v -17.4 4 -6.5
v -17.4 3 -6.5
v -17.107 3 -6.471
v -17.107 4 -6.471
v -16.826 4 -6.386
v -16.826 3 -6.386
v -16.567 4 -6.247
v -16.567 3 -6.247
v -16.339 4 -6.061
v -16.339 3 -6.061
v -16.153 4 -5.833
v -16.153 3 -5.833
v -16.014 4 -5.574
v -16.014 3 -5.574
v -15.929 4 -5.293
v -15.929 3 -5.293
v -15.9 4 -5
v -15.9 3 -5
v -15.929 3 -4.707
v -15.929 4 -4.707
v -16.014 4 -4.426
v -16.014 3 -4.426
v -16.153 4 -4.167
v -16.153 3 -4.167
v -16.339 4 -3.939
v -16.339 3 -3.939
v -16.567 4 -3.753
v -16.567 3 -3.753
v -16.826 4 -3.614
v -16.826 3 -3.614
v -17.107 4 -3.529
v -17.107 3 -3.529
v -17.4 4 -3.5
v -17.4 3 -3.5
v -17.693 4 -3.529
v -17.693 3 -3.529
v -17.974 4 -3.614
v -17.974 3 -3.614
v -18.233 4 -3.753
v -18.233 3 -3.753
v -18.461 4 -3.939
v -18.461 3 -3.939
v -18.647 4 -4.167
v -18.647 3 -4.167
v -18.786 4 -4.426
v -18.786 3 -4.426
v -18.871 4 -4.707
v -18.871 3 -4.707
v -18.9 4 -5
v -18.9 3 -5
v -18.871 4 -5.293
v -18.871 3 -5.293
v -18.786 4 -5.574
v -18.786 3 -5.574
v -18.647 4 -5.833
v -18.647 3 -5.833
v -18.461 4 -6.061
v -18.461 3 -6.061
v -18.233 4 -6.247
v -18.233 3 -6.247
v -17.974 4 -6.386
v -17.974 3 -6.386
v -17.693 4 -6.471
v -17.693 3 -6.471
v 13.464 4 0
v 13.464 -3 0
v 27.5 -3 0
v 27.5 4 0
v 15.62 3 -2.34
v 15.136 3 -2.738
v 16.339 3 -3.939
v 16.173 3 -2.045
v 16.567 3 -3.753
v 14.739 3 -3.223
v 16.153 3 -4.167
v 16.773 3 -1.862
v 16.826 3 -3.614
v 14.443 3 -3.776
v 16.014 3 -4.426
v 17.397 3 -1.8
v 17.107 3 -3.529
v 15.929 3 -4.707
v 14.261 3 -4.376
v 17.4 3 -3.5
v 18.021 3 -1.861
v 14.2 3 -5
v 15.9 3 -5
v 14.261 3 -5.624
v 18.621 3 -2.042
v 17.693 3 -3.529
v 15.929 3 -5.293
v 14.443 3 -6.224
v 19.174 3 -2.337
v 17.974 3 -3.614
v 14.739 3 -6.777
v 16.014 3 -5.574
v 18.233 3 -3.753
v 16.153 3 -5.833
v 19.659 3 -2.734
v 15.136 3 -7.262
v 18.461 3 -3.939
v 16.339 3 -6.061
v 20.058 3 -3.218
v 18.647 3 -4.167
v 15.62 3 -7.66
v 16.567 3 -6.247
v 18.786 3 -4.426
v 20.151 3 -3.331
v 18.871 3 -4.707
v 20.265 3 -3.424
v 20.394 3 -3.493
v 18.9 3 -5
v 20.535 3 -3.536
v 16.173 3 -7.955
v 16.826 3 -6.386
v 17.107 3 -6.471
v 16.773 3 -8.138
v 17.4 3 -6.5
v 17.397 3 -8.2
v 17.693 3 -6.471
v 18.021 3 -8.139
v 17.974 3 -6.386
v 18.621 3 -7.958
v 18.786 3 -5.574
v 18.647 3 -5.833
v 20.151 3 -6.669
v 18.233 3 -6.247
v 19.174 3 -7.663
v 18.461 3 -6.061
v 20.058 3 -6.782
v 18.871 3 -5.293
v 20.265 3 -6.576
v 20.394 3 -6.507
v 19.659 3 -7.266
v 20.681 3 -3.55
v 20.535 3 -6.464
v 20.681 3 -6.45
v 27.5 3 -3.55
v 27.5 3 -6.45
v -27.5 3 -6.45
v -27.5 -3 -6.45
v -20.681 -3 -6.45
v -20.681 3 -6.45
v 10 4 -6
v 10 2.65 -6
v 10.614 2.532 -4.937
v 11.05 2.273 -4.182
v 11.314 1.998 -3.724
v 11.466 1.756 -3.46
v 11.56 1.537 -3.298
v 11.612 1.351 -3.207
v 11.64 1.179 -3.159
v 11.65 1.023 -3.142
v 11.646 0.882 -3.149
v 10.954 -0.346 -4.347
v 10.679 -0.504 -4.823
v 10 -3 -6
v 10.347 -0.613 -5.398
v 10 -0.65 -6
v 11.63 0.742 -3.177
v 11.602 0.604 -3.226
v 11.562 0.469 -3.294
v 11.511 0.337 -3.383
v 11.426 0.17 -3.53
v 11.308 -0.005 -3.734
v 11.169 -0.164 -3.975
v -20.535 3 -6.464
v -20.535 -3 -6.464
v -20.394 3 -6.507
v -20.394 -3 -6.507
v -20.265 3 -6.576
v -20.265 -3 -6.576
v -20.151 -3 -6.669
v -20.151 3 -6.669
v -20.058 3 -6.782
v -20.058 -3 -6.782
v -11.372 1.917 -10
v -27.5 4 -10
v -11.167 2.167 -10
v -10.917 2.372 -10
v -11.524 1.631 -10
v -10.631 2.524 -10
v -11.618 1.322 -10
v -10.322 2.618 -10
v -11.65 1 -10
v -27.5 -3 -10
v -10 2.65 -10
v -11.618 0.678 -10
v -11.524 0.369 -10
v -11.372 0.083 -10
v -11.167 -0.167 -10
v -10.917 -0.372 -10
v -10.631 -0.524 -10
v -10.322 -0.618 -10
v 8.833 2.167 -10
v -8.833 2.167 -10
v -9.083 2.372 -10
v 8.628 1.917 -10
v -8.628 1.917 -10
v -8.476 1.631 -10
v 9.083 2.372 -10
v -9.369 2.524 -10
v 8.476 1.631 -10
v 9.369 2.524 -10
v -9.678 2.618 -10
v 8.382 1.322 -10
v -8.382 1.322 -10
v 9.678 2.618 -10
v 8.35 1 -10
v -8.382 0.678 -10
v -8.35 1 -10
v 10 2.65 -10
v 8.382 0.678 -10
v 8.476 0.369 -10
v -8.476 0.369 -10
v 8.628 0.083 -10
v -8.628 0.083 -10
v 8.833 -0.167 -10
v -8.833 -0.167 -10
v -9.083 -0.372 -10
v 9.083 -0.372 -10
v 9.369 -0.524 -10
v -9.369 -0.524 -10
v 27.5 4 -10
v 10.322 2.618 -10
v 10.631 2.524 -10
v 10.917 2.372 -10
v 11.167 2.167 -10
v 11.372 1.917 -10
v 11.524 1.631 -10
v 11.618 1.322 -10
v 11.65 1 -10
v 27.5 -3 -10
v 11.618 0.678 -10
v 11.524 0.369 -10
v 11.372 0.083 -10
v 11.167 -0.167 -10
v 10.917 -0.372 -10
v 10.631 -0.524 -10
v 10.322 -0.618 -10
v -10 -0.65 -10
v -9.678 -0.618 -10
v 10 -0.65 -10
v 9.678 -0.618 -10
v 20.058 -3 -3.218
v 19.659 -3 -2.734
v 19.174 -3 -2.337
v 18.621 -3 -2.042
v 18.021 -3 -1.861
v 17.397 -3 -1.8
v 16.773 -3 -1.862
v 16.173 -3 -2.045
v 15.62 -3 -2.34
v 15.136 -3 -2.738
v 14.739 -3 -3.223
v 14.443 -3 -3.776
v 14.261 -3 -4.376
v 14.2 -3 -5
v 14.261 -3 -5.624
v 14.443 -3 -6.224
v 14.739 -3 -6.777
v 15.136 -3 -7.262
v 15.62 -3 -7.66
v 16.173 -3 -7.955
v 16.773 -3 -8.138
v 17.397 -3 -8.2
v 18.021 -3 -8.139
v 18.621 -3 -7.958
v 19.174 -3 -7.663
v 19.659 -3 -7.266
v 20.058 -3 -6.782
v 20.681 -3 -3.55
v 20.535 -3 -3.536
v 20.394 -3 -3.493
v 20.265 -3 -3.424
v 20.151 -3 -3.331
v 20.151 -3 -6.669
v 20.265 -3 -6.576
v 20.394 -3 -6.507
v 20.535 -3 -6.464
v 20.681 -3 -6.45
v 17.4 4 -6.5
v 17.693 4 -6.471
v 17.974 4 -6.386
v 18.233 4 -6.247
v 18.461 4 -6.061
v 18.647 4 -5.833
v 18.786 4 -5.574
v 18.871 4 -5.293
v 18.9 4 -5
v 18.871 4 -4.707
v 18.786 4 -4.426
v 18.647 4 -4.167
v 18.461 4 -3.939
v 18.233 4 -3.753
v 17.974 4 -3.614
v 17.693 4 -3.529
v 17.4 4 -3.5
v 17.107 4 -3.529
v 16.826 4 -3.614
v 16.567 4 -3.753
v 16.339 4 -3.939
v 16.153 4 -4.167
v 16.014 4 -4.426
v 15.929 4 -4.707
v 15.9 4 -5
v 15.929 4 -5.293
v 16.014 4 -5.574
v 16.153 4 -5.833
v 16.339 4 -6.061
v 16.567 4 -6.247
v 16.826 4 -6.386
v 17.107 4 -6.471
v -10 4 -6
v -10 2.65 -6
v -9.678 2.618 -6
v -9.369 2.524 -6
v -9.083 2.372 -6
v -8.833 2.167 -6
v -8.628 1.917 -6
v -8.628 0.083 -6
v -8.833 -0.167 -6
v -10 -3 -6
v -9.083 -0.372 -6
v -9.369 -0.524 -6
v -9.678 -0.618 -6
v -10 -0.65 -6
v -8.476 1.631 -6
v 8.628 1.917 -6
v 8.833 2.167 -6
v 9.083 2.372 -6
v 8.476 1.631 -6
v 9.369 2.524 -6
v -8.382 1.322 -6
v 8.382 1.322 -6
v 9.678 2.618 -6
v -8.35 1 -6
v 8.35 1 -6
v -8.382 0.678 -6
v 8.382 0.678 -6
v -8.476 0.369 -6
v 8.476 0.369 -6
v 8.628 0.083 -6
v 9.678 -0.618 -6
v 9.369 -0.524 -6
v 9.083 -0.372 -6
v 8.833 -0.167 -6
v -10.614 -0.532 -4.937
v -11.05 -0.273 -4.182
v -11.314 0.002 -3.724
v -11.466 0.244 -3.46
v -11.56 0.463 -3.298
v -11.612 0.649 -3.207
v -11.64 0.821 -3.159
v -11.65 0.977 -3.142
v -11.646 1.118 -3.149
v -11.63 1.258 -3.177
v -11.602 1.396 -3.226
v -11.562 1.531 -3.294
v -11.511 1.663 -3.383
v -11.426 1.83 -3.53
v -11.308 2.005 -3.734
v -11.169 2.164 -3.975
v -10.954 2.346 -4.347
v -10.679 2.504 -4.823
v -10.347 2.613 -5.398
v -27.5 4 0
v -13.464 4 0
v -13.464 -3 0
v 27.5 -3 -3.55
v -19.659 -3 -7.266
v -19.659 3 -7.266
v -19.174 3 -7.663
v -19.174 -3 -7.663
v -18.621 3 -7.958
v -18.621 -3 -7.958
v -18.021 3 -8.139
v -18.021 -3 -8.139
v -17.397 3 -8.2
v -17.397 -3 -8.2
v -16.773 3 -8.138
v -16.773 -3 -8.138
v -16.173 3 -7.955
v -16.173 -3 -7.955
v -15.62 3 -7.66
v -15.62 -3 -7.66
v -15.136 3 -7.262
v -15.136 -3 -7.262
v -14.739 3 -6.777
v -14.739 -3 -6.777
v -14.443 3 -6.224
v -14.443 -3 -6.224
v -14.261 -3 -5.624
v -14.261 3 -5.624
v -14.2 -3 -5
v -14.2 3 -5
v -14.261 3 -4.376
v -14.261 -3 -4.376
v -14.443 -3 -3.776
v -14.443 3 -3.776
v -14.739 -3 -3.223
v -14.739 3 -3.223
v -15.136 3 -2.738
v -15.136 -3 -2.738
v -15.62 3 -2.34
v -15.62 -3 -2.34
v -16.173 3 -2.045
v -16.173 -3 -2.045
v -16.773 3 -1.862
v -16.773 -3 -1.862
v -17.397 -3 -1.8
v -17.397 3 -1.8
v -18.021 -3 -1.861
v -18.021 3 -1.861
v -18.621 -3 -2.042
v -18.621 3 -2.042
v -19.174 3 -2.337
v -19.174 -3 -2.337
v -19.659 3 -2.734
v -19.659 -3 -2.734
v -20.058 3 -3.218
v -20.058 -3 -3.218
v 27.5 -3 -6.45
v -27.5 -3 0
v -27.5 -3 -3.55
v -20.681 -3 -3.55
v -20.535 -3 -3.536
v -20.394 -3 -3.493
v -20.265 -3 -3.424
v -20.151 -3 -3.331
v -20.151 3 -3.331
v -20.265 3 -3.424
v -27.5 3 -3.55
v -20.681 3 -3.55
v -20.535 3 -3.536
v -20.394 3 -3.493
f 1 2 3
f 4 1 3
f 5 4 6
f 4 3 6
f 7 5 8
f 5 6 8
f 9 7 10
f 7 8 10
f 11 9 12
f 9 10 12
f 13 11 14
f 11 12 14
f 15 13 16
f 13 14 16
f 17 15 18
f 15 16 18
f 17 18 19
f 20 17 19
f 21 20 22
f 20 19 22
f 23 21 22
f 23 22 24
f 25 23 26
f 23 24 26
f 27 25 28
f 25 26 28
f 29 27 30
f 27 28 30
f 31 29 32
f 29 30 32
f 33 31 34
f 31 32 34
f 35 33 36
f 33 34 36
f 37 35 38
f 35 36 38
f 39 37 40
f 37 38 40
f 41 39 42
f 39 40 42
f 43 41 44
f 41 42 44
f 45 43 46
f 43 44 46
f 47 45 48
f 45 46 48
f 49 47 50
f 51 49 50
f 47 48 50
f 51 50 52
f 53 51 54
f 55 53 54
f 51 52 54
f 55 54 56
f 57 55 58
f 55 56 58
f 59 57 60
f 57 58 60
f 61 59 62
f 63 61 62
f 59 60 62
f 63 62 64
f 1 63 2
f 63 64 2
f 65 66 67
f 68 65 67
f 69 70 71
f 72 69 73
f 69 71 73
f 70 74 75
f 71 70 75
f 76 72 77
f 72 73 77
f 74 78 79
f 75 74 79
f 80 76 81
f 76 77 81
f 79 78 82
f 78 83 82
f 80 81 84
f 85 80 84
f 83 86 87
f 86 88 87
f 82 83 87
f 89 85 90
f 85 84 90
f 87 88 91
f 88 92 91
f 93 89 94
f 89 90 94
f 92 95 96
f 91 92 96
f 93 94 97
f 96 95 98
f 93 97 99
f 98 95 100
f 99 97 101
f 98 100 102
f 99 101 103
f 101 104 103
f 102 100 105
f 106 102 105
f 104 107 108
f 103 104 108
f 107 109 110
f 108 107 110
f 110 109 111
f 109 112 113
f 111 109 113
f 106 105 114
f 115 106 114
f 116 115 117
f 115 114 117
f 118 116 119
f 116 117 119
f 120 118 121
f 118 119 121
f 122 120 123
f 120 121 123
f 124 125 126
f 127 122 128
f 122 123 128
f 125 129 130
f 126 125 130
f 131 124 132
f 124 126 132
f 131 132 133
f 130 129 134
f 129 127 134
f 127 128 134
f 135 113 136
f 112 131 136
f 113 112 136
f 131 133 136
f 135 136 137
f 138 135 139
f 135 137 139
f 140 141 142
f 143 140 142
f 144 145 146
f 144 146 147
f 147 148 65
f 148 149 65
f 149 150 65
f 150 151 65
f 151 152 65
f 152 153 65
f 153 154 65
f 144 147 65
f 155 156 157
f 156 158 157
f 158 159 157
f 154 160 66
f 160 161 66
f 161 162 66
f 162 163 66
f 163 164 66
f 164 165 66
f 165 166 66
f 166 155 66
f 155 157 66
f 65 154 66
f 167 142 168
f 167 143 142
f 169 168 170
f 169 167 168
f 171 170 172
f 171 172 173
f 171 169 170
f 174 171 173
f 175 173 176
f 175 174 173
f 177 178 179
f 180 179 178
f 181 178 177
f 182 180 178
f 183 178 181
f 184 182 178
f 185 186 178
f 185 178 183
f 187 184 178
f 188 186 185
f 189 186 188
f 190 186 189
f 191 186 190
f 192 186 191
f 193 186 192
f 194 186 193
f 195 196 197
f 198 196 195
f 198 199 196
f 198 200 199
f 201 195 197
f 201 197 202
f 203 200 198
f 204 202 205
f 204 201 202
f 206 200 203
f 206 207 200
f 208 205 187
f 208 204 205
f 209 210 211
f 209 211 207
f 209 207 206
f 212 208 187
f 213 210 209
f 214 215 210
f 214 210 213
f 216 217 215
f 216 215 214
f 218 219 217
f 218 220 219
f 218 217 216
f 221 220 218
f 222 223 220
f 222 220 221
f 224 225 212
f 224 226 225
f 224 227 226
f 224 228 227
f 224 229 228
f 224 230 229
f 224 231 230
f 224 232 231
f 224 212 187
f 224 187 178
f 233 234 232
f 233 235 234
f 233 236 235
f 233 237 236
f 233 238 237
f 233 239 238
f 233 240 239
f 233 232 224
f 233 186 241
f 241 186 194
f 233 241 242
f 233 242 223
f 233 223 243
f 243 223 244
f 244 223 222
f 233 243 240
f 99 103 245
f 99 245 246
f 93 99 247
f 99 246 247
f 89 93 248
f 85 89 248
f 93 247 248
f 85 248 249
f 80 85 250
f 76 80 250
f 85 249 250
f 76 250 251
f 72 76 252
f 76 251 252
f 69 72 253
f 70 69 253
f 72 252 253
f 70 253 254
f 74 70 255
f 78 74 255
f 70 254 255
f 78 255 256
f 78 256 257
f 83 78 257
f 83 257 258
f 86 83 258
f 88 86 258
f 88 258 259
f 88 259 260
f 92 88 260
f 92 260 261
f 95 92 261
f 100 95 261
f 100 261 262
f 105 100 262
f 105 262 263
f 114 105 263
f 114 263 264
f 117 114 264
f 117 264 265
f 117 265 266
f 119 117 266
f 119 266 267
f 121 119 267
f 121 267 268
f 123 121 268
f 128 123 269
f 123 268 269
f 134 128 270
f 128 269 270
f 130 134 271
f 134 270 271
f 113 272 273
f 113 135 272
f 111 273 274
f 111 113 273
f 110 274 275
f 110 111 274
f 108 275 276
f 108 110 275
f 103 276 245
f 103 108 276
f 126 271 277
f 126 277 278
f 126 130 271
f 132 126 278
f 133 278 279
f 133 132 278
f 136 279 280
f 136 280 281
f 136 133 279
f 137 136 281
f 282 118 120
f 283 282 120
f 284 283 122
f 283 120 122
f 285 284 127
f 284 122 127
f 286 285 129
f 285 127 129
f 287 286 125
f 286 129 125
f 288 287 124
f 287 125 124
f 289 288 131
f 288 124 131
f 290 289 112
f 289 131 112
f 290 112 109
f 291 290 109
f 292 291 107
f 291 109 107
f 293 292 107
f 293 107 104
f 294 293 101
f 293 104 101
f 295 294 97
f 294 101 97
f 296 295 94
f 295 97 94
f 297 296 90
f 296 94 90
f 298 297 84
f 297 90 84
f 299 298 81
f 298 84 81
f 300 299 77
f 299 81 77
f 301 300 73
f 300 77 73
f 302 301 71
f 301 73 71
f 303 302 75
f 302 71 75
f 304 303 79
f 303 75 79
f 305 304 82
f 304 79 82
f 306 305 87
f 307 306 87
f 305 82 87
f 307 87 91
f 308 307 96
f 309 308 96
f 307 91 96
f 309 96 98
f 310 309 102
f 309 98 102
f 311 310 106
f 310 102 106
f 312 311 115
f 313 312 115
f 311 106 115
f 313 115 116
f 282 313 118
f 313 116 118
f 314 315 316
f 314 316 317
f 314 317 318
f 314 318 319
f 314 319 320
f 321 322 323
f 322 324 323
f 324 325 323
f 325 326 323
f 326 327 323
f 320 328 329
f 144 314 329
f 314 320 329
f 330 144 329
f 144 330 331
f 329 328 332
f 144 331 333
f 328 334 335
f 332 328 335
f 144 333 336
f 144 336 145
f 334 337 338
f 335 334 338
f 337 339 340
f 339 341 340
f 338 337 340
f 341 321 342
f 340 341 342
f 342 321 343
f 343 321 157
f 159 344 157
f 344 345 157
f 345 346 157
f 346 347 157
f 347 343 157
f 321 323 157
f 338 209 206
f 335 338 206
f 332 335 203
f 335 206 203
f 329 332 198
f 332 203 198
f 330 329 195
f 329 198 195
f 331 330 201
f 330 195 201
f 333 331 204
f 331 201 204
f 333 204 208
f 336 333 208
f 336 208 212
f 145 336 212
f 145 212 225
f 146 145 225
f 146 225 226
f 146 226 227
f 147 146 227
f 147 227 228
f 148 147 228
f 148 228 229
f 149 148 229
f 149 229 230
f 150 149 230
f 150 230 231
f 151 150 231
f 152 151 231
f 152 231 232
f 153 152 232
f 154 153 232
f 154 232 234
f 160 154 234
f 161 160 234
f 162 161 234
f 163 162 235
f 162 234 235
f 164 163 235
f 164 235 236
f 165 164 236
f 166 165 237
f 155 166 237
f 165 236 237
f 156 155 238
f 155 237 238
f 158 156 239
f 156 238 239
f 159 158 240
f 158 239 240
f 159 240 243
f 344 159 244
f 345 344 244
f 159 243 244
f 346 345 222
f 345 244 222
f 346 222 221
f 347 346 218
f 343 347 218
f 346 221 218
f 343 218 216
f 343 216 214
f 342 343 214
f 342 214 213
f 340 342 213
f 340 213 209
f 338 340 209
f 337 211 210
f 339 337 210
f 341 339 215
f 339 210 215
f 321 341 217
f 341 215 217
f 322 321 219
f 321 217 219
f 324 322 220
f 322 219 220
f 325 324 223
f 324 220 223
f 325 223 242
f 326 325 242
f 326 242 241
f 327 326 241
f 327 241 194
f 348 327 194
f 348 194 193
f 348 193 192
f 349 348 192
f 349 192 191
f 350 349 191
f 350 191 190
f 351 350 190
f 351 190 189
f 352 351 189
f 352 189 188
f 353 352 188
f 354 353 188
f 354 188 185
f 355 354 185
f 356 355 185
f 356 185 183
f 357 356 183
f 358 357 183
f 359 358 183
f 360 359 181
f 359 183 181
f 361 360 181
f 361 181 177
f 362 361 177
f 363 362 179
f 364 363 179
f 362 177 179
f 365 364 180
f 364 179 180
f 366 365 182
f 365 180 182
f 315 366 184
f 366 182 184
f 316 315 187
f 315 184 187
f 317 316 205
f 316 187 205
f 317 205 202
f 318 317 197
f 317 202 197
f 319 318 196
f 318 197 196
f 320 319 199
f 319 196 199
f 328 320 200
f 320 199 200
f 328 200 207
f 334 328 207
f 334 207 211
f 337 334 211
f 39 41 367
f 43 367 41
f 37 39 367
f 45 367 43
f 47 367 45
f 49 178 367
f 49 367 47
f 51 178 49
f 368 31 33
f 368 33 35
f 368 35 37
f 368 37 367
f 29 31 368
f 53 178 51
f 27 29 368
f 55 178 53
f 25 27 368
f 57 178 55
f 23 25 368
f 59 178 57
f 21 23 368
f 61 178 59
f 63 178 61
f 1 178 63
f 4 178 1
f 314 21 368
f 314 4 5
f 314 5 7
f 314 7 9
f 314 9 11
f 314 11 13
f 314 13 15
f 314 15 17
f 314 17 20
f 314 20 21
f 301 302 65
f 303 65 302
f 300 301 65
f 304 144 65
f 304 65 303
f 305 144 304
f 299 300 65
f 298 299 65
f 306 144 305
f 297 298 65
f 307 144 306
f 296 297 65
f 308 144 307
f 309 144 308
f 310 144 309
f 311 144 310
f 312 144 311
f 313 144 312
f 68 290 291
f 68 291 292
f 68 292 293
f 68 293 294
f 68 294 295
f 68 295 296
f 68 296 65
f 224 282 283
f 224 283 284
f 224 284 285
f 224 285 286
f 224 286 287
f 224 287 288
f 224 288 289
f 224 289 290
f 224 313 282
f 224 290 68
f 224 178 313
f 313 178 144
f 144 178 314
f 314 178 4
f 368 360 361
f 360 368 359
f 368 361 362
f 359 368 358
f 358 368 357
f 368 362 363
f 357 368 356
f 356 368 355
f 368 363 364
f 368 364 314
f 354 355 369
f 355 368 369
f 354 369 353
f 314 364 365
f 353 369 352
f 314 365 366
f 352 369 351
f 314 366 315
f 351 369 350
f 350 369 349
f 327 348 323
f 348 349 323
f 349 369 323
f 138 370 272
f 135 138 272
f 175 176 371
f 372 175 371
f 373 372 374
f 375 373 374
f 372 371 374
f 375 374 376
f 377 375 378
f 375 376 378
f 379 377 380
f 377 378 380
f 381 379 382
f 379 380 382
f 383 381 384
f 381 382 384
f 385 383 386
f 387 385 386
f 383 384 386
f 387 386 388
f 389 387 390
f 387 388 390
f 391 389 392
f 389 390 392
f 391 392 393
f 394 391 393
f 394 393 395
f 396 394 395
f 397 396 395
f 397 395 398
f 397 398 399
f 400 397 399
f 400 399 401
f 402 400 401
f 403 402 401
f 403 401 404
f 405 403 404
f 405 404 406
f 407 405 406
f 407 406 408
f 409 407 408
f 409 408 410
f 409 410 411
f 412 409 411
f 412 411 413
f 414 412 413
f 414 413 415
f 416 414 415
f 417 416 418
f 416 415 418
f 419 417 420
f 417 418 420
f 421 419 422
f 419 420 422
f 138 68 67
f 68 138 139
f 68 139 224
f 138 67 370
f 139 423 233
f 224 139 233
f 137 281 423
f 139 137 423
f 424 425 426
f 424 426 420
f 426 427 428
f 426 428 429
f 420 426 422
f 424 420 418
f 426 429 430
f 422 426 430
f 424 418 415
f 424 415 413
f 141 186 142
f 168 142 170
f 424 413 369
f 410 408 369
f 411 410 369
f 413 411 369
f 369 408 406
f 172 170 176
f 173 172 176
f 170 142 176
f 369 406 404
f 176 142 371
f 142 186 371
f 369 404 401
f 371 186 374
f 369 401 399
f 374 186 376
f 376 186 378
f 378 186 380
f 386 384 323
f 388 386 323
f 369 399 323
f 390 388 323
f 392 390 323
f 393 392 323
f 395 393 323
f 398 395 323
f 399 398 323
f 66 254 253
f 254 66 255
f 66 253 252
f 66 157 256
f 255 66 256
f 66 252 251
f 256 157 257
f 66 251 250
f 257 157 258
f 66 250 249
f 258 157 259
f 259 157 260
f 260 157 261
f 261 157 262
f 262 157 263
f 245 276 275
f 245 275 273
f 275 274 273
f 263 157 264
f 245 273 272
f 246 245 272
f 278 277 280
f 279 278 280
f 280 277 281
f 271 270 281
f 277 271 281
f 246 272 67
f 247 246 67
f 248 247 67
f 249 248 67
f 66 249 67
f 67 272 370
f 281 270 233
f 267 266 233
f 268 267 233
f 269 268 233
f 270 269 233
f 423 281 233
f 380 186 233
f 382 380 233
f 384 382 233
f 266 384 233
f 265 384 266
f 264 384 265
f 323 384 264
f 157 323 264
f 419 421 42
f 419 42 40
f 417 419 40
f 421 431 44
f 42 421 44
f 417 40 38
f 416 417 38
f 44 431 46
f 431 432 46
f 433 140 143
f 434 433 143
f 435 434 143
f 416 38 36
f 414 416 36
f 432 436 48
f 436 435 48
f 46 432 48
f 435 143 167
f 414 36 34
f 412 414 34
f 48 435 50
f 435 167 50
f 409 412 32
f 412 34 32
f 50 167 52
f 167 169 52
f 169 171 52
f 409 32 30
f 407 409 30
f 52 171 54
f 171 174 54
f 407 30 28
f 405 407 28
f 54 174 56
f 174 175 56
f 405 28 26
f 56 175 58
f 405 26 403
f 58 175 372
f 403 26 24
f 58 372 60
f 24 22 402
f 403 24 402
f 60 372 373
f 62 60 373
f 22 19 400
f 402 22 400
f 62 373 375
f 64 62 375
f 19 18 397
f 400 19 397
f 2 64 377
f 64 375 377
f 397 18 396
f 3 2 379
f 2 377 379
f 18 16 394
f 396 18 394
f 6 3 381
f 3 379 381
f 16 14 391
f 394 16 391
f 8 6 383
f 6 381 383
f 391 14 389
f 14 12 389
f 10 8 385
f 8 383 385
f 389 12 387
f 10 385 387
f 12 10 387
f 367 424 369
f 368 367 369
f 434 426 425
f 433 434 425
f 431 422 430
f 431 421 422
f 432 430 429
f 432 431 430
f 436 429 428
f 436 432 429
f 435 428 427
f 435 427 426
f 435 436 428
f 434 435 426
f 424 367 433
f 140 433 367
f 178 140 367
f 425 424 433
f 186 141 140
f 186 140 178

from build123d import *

# Parameters (mm, degrees)
BOSS_EXTRUDE3_DEPTH      = 3
BOSS_EXTRUDE3_DEPTH_BACK = 3
FILLET1_R                = 0.75
SKETCH5_W                = 55
SKETCH5_H                = 10
BOSS_EXTRUDE4_DEPTH      = 1
SKETCH6_R                = 1.65
CUT_EXTRUDE2_DEPTH       = 10
SKETCH7_R                = 1.5
CUT_EXTRUDE3_DEPTH       = 1
CUT_EXTRUDE4_REACH       = 32.087


with BuildPart() as part:
    # Sketch1 → Boss-Extrude3 (new, two sides: drawn at the far end of the back side and taken through both)
    with BuildSketch(Plane(origin=(0, 0, 0), x_dir=(1, 0, 0), z_dir=(0, 1, 0)).offset(-BOSS_EXTRUDE3_DEPTH_BACK)):
        with BuildLine():
            Line((27.5, 10), (-27.5, 10))
            Line((-27.5, 10), (-27.5, 6.45))
            Line((-27.5, 6.45), (-20.252630365, 6.45))
            ThreePointArc((-20.252630365, 6.45), (-14.2, 5), (-20.252630365, 3.55))
            Line((-20.252630365, 3.55), (-27.5, 3.55))
            Line((-27.5, 3.55), (-27.5, 0))
            Line((-27.5, 0), (27.5, 0))
            Line((27.5, 0), (27.5, 3.55))
            Line((27.5, 3.55), (20.252630365, 3.55))
            ThreePointArc((20.252630365, 3.55), (14.2, 5), (20.252630365, 6.45))
            Line((20.252630365, 6.45), (27.5, 6.45))
            Line((27.5, 6.45), (27.5, 10))
        make_face()
    extrude(amount=BOSS_EXTRUDE3_DEPTH + BOSS_EXTRUDE3_DEPTH_BACK)

    # Fillet1
    fillet1_edges = [part.edges().sort_by_distance(p)[0] for p in [
        (-20.252630365, 0, -6.45),
        (20.252630365, 0, -6.45),
        (20.252630365, 0, -3.55),
        (-20.252630365, 0, -3.55),
    ]]
    fillet(fillet1_edges, radius=FILLET1_R)

    # Sketch5 → Boss-Extrude4 (add)
    with BuildSketch(Plane(origin=(0, 3, 0), x_dir=(1, 0, 0), z_dir=(0, 1, 0))):
        with Locations((0, 5)):
            Rectangle(SKETCH5_W, SKETCH5_H)
    extrude(amount=BOSS_EXTRUDE4_DEPTH)

    # Sketch6 → Cut-Extrude2 (cut)
    with BuildSketch(Plane(origin=(0, 0, -10), x_dir=(-1, 0, 0), z_dir=(0, 0, -1))):
        with Locations((-10, 1)):
            Circle(SKETCH6_R)
        with Locations(Location((10, 1, 0), (0, 0, 180))):
            Circle(SKETCH6_R)
    extrude(amount=-CUT_EXTRUDE2_DEPTH, mode=Mode.SUBTRACT)

    # Sketch7 → Cut-Extrude3 (cut)
    with BuildSketch(Plane.XZ.offset(-3)):
        with Locations(Location((-17.4, -5, 0), (0, 0, 270))):
            Circle(SKETCH7_R)
        with Locations(Location((17.4, -5, 0), (0, 0, 270))):
            Circle(SKETCH7_R)
    extrude(amount=-CUT_EXTRUDE3_DEPTH, mode=Mode.SUBTRACT)

    # Cut-Extrude4: up to this face of the body (flat: up to its plane)
    cut_extrude4_end = Plane(part.part.faces().sort_by_distance((0, 4, -5))[0])
    # Sketch8 → Cut-Extrude4 (cut, up to the picked face)
    with BuildSketch(Plane.XZ.offset(3), mode=Mode.PRIVATE) as cut_extrude4_sk1:
        Polygon((-13.464101615, 0), (-10, -6), (10, -6), (13.464101615, 0), align=None)
    cut_extrude4_tool1 = split(extrude(cut_extrude4_sk1.sketch, amount=-CUT_EXTRUDE4_REACH, mode=Mode.PRIVATE), bisect_by=cut_extrude4_end, keep=Keep.BOTH, mode=Mode.PRIVATE)
    add(cut_extrude4_tool1.solids().sort_by(Axis((0, -3, -2.852366), (0, 1, 0)))[0], mode=Mode.SUBTRACT)


solid = part.part
